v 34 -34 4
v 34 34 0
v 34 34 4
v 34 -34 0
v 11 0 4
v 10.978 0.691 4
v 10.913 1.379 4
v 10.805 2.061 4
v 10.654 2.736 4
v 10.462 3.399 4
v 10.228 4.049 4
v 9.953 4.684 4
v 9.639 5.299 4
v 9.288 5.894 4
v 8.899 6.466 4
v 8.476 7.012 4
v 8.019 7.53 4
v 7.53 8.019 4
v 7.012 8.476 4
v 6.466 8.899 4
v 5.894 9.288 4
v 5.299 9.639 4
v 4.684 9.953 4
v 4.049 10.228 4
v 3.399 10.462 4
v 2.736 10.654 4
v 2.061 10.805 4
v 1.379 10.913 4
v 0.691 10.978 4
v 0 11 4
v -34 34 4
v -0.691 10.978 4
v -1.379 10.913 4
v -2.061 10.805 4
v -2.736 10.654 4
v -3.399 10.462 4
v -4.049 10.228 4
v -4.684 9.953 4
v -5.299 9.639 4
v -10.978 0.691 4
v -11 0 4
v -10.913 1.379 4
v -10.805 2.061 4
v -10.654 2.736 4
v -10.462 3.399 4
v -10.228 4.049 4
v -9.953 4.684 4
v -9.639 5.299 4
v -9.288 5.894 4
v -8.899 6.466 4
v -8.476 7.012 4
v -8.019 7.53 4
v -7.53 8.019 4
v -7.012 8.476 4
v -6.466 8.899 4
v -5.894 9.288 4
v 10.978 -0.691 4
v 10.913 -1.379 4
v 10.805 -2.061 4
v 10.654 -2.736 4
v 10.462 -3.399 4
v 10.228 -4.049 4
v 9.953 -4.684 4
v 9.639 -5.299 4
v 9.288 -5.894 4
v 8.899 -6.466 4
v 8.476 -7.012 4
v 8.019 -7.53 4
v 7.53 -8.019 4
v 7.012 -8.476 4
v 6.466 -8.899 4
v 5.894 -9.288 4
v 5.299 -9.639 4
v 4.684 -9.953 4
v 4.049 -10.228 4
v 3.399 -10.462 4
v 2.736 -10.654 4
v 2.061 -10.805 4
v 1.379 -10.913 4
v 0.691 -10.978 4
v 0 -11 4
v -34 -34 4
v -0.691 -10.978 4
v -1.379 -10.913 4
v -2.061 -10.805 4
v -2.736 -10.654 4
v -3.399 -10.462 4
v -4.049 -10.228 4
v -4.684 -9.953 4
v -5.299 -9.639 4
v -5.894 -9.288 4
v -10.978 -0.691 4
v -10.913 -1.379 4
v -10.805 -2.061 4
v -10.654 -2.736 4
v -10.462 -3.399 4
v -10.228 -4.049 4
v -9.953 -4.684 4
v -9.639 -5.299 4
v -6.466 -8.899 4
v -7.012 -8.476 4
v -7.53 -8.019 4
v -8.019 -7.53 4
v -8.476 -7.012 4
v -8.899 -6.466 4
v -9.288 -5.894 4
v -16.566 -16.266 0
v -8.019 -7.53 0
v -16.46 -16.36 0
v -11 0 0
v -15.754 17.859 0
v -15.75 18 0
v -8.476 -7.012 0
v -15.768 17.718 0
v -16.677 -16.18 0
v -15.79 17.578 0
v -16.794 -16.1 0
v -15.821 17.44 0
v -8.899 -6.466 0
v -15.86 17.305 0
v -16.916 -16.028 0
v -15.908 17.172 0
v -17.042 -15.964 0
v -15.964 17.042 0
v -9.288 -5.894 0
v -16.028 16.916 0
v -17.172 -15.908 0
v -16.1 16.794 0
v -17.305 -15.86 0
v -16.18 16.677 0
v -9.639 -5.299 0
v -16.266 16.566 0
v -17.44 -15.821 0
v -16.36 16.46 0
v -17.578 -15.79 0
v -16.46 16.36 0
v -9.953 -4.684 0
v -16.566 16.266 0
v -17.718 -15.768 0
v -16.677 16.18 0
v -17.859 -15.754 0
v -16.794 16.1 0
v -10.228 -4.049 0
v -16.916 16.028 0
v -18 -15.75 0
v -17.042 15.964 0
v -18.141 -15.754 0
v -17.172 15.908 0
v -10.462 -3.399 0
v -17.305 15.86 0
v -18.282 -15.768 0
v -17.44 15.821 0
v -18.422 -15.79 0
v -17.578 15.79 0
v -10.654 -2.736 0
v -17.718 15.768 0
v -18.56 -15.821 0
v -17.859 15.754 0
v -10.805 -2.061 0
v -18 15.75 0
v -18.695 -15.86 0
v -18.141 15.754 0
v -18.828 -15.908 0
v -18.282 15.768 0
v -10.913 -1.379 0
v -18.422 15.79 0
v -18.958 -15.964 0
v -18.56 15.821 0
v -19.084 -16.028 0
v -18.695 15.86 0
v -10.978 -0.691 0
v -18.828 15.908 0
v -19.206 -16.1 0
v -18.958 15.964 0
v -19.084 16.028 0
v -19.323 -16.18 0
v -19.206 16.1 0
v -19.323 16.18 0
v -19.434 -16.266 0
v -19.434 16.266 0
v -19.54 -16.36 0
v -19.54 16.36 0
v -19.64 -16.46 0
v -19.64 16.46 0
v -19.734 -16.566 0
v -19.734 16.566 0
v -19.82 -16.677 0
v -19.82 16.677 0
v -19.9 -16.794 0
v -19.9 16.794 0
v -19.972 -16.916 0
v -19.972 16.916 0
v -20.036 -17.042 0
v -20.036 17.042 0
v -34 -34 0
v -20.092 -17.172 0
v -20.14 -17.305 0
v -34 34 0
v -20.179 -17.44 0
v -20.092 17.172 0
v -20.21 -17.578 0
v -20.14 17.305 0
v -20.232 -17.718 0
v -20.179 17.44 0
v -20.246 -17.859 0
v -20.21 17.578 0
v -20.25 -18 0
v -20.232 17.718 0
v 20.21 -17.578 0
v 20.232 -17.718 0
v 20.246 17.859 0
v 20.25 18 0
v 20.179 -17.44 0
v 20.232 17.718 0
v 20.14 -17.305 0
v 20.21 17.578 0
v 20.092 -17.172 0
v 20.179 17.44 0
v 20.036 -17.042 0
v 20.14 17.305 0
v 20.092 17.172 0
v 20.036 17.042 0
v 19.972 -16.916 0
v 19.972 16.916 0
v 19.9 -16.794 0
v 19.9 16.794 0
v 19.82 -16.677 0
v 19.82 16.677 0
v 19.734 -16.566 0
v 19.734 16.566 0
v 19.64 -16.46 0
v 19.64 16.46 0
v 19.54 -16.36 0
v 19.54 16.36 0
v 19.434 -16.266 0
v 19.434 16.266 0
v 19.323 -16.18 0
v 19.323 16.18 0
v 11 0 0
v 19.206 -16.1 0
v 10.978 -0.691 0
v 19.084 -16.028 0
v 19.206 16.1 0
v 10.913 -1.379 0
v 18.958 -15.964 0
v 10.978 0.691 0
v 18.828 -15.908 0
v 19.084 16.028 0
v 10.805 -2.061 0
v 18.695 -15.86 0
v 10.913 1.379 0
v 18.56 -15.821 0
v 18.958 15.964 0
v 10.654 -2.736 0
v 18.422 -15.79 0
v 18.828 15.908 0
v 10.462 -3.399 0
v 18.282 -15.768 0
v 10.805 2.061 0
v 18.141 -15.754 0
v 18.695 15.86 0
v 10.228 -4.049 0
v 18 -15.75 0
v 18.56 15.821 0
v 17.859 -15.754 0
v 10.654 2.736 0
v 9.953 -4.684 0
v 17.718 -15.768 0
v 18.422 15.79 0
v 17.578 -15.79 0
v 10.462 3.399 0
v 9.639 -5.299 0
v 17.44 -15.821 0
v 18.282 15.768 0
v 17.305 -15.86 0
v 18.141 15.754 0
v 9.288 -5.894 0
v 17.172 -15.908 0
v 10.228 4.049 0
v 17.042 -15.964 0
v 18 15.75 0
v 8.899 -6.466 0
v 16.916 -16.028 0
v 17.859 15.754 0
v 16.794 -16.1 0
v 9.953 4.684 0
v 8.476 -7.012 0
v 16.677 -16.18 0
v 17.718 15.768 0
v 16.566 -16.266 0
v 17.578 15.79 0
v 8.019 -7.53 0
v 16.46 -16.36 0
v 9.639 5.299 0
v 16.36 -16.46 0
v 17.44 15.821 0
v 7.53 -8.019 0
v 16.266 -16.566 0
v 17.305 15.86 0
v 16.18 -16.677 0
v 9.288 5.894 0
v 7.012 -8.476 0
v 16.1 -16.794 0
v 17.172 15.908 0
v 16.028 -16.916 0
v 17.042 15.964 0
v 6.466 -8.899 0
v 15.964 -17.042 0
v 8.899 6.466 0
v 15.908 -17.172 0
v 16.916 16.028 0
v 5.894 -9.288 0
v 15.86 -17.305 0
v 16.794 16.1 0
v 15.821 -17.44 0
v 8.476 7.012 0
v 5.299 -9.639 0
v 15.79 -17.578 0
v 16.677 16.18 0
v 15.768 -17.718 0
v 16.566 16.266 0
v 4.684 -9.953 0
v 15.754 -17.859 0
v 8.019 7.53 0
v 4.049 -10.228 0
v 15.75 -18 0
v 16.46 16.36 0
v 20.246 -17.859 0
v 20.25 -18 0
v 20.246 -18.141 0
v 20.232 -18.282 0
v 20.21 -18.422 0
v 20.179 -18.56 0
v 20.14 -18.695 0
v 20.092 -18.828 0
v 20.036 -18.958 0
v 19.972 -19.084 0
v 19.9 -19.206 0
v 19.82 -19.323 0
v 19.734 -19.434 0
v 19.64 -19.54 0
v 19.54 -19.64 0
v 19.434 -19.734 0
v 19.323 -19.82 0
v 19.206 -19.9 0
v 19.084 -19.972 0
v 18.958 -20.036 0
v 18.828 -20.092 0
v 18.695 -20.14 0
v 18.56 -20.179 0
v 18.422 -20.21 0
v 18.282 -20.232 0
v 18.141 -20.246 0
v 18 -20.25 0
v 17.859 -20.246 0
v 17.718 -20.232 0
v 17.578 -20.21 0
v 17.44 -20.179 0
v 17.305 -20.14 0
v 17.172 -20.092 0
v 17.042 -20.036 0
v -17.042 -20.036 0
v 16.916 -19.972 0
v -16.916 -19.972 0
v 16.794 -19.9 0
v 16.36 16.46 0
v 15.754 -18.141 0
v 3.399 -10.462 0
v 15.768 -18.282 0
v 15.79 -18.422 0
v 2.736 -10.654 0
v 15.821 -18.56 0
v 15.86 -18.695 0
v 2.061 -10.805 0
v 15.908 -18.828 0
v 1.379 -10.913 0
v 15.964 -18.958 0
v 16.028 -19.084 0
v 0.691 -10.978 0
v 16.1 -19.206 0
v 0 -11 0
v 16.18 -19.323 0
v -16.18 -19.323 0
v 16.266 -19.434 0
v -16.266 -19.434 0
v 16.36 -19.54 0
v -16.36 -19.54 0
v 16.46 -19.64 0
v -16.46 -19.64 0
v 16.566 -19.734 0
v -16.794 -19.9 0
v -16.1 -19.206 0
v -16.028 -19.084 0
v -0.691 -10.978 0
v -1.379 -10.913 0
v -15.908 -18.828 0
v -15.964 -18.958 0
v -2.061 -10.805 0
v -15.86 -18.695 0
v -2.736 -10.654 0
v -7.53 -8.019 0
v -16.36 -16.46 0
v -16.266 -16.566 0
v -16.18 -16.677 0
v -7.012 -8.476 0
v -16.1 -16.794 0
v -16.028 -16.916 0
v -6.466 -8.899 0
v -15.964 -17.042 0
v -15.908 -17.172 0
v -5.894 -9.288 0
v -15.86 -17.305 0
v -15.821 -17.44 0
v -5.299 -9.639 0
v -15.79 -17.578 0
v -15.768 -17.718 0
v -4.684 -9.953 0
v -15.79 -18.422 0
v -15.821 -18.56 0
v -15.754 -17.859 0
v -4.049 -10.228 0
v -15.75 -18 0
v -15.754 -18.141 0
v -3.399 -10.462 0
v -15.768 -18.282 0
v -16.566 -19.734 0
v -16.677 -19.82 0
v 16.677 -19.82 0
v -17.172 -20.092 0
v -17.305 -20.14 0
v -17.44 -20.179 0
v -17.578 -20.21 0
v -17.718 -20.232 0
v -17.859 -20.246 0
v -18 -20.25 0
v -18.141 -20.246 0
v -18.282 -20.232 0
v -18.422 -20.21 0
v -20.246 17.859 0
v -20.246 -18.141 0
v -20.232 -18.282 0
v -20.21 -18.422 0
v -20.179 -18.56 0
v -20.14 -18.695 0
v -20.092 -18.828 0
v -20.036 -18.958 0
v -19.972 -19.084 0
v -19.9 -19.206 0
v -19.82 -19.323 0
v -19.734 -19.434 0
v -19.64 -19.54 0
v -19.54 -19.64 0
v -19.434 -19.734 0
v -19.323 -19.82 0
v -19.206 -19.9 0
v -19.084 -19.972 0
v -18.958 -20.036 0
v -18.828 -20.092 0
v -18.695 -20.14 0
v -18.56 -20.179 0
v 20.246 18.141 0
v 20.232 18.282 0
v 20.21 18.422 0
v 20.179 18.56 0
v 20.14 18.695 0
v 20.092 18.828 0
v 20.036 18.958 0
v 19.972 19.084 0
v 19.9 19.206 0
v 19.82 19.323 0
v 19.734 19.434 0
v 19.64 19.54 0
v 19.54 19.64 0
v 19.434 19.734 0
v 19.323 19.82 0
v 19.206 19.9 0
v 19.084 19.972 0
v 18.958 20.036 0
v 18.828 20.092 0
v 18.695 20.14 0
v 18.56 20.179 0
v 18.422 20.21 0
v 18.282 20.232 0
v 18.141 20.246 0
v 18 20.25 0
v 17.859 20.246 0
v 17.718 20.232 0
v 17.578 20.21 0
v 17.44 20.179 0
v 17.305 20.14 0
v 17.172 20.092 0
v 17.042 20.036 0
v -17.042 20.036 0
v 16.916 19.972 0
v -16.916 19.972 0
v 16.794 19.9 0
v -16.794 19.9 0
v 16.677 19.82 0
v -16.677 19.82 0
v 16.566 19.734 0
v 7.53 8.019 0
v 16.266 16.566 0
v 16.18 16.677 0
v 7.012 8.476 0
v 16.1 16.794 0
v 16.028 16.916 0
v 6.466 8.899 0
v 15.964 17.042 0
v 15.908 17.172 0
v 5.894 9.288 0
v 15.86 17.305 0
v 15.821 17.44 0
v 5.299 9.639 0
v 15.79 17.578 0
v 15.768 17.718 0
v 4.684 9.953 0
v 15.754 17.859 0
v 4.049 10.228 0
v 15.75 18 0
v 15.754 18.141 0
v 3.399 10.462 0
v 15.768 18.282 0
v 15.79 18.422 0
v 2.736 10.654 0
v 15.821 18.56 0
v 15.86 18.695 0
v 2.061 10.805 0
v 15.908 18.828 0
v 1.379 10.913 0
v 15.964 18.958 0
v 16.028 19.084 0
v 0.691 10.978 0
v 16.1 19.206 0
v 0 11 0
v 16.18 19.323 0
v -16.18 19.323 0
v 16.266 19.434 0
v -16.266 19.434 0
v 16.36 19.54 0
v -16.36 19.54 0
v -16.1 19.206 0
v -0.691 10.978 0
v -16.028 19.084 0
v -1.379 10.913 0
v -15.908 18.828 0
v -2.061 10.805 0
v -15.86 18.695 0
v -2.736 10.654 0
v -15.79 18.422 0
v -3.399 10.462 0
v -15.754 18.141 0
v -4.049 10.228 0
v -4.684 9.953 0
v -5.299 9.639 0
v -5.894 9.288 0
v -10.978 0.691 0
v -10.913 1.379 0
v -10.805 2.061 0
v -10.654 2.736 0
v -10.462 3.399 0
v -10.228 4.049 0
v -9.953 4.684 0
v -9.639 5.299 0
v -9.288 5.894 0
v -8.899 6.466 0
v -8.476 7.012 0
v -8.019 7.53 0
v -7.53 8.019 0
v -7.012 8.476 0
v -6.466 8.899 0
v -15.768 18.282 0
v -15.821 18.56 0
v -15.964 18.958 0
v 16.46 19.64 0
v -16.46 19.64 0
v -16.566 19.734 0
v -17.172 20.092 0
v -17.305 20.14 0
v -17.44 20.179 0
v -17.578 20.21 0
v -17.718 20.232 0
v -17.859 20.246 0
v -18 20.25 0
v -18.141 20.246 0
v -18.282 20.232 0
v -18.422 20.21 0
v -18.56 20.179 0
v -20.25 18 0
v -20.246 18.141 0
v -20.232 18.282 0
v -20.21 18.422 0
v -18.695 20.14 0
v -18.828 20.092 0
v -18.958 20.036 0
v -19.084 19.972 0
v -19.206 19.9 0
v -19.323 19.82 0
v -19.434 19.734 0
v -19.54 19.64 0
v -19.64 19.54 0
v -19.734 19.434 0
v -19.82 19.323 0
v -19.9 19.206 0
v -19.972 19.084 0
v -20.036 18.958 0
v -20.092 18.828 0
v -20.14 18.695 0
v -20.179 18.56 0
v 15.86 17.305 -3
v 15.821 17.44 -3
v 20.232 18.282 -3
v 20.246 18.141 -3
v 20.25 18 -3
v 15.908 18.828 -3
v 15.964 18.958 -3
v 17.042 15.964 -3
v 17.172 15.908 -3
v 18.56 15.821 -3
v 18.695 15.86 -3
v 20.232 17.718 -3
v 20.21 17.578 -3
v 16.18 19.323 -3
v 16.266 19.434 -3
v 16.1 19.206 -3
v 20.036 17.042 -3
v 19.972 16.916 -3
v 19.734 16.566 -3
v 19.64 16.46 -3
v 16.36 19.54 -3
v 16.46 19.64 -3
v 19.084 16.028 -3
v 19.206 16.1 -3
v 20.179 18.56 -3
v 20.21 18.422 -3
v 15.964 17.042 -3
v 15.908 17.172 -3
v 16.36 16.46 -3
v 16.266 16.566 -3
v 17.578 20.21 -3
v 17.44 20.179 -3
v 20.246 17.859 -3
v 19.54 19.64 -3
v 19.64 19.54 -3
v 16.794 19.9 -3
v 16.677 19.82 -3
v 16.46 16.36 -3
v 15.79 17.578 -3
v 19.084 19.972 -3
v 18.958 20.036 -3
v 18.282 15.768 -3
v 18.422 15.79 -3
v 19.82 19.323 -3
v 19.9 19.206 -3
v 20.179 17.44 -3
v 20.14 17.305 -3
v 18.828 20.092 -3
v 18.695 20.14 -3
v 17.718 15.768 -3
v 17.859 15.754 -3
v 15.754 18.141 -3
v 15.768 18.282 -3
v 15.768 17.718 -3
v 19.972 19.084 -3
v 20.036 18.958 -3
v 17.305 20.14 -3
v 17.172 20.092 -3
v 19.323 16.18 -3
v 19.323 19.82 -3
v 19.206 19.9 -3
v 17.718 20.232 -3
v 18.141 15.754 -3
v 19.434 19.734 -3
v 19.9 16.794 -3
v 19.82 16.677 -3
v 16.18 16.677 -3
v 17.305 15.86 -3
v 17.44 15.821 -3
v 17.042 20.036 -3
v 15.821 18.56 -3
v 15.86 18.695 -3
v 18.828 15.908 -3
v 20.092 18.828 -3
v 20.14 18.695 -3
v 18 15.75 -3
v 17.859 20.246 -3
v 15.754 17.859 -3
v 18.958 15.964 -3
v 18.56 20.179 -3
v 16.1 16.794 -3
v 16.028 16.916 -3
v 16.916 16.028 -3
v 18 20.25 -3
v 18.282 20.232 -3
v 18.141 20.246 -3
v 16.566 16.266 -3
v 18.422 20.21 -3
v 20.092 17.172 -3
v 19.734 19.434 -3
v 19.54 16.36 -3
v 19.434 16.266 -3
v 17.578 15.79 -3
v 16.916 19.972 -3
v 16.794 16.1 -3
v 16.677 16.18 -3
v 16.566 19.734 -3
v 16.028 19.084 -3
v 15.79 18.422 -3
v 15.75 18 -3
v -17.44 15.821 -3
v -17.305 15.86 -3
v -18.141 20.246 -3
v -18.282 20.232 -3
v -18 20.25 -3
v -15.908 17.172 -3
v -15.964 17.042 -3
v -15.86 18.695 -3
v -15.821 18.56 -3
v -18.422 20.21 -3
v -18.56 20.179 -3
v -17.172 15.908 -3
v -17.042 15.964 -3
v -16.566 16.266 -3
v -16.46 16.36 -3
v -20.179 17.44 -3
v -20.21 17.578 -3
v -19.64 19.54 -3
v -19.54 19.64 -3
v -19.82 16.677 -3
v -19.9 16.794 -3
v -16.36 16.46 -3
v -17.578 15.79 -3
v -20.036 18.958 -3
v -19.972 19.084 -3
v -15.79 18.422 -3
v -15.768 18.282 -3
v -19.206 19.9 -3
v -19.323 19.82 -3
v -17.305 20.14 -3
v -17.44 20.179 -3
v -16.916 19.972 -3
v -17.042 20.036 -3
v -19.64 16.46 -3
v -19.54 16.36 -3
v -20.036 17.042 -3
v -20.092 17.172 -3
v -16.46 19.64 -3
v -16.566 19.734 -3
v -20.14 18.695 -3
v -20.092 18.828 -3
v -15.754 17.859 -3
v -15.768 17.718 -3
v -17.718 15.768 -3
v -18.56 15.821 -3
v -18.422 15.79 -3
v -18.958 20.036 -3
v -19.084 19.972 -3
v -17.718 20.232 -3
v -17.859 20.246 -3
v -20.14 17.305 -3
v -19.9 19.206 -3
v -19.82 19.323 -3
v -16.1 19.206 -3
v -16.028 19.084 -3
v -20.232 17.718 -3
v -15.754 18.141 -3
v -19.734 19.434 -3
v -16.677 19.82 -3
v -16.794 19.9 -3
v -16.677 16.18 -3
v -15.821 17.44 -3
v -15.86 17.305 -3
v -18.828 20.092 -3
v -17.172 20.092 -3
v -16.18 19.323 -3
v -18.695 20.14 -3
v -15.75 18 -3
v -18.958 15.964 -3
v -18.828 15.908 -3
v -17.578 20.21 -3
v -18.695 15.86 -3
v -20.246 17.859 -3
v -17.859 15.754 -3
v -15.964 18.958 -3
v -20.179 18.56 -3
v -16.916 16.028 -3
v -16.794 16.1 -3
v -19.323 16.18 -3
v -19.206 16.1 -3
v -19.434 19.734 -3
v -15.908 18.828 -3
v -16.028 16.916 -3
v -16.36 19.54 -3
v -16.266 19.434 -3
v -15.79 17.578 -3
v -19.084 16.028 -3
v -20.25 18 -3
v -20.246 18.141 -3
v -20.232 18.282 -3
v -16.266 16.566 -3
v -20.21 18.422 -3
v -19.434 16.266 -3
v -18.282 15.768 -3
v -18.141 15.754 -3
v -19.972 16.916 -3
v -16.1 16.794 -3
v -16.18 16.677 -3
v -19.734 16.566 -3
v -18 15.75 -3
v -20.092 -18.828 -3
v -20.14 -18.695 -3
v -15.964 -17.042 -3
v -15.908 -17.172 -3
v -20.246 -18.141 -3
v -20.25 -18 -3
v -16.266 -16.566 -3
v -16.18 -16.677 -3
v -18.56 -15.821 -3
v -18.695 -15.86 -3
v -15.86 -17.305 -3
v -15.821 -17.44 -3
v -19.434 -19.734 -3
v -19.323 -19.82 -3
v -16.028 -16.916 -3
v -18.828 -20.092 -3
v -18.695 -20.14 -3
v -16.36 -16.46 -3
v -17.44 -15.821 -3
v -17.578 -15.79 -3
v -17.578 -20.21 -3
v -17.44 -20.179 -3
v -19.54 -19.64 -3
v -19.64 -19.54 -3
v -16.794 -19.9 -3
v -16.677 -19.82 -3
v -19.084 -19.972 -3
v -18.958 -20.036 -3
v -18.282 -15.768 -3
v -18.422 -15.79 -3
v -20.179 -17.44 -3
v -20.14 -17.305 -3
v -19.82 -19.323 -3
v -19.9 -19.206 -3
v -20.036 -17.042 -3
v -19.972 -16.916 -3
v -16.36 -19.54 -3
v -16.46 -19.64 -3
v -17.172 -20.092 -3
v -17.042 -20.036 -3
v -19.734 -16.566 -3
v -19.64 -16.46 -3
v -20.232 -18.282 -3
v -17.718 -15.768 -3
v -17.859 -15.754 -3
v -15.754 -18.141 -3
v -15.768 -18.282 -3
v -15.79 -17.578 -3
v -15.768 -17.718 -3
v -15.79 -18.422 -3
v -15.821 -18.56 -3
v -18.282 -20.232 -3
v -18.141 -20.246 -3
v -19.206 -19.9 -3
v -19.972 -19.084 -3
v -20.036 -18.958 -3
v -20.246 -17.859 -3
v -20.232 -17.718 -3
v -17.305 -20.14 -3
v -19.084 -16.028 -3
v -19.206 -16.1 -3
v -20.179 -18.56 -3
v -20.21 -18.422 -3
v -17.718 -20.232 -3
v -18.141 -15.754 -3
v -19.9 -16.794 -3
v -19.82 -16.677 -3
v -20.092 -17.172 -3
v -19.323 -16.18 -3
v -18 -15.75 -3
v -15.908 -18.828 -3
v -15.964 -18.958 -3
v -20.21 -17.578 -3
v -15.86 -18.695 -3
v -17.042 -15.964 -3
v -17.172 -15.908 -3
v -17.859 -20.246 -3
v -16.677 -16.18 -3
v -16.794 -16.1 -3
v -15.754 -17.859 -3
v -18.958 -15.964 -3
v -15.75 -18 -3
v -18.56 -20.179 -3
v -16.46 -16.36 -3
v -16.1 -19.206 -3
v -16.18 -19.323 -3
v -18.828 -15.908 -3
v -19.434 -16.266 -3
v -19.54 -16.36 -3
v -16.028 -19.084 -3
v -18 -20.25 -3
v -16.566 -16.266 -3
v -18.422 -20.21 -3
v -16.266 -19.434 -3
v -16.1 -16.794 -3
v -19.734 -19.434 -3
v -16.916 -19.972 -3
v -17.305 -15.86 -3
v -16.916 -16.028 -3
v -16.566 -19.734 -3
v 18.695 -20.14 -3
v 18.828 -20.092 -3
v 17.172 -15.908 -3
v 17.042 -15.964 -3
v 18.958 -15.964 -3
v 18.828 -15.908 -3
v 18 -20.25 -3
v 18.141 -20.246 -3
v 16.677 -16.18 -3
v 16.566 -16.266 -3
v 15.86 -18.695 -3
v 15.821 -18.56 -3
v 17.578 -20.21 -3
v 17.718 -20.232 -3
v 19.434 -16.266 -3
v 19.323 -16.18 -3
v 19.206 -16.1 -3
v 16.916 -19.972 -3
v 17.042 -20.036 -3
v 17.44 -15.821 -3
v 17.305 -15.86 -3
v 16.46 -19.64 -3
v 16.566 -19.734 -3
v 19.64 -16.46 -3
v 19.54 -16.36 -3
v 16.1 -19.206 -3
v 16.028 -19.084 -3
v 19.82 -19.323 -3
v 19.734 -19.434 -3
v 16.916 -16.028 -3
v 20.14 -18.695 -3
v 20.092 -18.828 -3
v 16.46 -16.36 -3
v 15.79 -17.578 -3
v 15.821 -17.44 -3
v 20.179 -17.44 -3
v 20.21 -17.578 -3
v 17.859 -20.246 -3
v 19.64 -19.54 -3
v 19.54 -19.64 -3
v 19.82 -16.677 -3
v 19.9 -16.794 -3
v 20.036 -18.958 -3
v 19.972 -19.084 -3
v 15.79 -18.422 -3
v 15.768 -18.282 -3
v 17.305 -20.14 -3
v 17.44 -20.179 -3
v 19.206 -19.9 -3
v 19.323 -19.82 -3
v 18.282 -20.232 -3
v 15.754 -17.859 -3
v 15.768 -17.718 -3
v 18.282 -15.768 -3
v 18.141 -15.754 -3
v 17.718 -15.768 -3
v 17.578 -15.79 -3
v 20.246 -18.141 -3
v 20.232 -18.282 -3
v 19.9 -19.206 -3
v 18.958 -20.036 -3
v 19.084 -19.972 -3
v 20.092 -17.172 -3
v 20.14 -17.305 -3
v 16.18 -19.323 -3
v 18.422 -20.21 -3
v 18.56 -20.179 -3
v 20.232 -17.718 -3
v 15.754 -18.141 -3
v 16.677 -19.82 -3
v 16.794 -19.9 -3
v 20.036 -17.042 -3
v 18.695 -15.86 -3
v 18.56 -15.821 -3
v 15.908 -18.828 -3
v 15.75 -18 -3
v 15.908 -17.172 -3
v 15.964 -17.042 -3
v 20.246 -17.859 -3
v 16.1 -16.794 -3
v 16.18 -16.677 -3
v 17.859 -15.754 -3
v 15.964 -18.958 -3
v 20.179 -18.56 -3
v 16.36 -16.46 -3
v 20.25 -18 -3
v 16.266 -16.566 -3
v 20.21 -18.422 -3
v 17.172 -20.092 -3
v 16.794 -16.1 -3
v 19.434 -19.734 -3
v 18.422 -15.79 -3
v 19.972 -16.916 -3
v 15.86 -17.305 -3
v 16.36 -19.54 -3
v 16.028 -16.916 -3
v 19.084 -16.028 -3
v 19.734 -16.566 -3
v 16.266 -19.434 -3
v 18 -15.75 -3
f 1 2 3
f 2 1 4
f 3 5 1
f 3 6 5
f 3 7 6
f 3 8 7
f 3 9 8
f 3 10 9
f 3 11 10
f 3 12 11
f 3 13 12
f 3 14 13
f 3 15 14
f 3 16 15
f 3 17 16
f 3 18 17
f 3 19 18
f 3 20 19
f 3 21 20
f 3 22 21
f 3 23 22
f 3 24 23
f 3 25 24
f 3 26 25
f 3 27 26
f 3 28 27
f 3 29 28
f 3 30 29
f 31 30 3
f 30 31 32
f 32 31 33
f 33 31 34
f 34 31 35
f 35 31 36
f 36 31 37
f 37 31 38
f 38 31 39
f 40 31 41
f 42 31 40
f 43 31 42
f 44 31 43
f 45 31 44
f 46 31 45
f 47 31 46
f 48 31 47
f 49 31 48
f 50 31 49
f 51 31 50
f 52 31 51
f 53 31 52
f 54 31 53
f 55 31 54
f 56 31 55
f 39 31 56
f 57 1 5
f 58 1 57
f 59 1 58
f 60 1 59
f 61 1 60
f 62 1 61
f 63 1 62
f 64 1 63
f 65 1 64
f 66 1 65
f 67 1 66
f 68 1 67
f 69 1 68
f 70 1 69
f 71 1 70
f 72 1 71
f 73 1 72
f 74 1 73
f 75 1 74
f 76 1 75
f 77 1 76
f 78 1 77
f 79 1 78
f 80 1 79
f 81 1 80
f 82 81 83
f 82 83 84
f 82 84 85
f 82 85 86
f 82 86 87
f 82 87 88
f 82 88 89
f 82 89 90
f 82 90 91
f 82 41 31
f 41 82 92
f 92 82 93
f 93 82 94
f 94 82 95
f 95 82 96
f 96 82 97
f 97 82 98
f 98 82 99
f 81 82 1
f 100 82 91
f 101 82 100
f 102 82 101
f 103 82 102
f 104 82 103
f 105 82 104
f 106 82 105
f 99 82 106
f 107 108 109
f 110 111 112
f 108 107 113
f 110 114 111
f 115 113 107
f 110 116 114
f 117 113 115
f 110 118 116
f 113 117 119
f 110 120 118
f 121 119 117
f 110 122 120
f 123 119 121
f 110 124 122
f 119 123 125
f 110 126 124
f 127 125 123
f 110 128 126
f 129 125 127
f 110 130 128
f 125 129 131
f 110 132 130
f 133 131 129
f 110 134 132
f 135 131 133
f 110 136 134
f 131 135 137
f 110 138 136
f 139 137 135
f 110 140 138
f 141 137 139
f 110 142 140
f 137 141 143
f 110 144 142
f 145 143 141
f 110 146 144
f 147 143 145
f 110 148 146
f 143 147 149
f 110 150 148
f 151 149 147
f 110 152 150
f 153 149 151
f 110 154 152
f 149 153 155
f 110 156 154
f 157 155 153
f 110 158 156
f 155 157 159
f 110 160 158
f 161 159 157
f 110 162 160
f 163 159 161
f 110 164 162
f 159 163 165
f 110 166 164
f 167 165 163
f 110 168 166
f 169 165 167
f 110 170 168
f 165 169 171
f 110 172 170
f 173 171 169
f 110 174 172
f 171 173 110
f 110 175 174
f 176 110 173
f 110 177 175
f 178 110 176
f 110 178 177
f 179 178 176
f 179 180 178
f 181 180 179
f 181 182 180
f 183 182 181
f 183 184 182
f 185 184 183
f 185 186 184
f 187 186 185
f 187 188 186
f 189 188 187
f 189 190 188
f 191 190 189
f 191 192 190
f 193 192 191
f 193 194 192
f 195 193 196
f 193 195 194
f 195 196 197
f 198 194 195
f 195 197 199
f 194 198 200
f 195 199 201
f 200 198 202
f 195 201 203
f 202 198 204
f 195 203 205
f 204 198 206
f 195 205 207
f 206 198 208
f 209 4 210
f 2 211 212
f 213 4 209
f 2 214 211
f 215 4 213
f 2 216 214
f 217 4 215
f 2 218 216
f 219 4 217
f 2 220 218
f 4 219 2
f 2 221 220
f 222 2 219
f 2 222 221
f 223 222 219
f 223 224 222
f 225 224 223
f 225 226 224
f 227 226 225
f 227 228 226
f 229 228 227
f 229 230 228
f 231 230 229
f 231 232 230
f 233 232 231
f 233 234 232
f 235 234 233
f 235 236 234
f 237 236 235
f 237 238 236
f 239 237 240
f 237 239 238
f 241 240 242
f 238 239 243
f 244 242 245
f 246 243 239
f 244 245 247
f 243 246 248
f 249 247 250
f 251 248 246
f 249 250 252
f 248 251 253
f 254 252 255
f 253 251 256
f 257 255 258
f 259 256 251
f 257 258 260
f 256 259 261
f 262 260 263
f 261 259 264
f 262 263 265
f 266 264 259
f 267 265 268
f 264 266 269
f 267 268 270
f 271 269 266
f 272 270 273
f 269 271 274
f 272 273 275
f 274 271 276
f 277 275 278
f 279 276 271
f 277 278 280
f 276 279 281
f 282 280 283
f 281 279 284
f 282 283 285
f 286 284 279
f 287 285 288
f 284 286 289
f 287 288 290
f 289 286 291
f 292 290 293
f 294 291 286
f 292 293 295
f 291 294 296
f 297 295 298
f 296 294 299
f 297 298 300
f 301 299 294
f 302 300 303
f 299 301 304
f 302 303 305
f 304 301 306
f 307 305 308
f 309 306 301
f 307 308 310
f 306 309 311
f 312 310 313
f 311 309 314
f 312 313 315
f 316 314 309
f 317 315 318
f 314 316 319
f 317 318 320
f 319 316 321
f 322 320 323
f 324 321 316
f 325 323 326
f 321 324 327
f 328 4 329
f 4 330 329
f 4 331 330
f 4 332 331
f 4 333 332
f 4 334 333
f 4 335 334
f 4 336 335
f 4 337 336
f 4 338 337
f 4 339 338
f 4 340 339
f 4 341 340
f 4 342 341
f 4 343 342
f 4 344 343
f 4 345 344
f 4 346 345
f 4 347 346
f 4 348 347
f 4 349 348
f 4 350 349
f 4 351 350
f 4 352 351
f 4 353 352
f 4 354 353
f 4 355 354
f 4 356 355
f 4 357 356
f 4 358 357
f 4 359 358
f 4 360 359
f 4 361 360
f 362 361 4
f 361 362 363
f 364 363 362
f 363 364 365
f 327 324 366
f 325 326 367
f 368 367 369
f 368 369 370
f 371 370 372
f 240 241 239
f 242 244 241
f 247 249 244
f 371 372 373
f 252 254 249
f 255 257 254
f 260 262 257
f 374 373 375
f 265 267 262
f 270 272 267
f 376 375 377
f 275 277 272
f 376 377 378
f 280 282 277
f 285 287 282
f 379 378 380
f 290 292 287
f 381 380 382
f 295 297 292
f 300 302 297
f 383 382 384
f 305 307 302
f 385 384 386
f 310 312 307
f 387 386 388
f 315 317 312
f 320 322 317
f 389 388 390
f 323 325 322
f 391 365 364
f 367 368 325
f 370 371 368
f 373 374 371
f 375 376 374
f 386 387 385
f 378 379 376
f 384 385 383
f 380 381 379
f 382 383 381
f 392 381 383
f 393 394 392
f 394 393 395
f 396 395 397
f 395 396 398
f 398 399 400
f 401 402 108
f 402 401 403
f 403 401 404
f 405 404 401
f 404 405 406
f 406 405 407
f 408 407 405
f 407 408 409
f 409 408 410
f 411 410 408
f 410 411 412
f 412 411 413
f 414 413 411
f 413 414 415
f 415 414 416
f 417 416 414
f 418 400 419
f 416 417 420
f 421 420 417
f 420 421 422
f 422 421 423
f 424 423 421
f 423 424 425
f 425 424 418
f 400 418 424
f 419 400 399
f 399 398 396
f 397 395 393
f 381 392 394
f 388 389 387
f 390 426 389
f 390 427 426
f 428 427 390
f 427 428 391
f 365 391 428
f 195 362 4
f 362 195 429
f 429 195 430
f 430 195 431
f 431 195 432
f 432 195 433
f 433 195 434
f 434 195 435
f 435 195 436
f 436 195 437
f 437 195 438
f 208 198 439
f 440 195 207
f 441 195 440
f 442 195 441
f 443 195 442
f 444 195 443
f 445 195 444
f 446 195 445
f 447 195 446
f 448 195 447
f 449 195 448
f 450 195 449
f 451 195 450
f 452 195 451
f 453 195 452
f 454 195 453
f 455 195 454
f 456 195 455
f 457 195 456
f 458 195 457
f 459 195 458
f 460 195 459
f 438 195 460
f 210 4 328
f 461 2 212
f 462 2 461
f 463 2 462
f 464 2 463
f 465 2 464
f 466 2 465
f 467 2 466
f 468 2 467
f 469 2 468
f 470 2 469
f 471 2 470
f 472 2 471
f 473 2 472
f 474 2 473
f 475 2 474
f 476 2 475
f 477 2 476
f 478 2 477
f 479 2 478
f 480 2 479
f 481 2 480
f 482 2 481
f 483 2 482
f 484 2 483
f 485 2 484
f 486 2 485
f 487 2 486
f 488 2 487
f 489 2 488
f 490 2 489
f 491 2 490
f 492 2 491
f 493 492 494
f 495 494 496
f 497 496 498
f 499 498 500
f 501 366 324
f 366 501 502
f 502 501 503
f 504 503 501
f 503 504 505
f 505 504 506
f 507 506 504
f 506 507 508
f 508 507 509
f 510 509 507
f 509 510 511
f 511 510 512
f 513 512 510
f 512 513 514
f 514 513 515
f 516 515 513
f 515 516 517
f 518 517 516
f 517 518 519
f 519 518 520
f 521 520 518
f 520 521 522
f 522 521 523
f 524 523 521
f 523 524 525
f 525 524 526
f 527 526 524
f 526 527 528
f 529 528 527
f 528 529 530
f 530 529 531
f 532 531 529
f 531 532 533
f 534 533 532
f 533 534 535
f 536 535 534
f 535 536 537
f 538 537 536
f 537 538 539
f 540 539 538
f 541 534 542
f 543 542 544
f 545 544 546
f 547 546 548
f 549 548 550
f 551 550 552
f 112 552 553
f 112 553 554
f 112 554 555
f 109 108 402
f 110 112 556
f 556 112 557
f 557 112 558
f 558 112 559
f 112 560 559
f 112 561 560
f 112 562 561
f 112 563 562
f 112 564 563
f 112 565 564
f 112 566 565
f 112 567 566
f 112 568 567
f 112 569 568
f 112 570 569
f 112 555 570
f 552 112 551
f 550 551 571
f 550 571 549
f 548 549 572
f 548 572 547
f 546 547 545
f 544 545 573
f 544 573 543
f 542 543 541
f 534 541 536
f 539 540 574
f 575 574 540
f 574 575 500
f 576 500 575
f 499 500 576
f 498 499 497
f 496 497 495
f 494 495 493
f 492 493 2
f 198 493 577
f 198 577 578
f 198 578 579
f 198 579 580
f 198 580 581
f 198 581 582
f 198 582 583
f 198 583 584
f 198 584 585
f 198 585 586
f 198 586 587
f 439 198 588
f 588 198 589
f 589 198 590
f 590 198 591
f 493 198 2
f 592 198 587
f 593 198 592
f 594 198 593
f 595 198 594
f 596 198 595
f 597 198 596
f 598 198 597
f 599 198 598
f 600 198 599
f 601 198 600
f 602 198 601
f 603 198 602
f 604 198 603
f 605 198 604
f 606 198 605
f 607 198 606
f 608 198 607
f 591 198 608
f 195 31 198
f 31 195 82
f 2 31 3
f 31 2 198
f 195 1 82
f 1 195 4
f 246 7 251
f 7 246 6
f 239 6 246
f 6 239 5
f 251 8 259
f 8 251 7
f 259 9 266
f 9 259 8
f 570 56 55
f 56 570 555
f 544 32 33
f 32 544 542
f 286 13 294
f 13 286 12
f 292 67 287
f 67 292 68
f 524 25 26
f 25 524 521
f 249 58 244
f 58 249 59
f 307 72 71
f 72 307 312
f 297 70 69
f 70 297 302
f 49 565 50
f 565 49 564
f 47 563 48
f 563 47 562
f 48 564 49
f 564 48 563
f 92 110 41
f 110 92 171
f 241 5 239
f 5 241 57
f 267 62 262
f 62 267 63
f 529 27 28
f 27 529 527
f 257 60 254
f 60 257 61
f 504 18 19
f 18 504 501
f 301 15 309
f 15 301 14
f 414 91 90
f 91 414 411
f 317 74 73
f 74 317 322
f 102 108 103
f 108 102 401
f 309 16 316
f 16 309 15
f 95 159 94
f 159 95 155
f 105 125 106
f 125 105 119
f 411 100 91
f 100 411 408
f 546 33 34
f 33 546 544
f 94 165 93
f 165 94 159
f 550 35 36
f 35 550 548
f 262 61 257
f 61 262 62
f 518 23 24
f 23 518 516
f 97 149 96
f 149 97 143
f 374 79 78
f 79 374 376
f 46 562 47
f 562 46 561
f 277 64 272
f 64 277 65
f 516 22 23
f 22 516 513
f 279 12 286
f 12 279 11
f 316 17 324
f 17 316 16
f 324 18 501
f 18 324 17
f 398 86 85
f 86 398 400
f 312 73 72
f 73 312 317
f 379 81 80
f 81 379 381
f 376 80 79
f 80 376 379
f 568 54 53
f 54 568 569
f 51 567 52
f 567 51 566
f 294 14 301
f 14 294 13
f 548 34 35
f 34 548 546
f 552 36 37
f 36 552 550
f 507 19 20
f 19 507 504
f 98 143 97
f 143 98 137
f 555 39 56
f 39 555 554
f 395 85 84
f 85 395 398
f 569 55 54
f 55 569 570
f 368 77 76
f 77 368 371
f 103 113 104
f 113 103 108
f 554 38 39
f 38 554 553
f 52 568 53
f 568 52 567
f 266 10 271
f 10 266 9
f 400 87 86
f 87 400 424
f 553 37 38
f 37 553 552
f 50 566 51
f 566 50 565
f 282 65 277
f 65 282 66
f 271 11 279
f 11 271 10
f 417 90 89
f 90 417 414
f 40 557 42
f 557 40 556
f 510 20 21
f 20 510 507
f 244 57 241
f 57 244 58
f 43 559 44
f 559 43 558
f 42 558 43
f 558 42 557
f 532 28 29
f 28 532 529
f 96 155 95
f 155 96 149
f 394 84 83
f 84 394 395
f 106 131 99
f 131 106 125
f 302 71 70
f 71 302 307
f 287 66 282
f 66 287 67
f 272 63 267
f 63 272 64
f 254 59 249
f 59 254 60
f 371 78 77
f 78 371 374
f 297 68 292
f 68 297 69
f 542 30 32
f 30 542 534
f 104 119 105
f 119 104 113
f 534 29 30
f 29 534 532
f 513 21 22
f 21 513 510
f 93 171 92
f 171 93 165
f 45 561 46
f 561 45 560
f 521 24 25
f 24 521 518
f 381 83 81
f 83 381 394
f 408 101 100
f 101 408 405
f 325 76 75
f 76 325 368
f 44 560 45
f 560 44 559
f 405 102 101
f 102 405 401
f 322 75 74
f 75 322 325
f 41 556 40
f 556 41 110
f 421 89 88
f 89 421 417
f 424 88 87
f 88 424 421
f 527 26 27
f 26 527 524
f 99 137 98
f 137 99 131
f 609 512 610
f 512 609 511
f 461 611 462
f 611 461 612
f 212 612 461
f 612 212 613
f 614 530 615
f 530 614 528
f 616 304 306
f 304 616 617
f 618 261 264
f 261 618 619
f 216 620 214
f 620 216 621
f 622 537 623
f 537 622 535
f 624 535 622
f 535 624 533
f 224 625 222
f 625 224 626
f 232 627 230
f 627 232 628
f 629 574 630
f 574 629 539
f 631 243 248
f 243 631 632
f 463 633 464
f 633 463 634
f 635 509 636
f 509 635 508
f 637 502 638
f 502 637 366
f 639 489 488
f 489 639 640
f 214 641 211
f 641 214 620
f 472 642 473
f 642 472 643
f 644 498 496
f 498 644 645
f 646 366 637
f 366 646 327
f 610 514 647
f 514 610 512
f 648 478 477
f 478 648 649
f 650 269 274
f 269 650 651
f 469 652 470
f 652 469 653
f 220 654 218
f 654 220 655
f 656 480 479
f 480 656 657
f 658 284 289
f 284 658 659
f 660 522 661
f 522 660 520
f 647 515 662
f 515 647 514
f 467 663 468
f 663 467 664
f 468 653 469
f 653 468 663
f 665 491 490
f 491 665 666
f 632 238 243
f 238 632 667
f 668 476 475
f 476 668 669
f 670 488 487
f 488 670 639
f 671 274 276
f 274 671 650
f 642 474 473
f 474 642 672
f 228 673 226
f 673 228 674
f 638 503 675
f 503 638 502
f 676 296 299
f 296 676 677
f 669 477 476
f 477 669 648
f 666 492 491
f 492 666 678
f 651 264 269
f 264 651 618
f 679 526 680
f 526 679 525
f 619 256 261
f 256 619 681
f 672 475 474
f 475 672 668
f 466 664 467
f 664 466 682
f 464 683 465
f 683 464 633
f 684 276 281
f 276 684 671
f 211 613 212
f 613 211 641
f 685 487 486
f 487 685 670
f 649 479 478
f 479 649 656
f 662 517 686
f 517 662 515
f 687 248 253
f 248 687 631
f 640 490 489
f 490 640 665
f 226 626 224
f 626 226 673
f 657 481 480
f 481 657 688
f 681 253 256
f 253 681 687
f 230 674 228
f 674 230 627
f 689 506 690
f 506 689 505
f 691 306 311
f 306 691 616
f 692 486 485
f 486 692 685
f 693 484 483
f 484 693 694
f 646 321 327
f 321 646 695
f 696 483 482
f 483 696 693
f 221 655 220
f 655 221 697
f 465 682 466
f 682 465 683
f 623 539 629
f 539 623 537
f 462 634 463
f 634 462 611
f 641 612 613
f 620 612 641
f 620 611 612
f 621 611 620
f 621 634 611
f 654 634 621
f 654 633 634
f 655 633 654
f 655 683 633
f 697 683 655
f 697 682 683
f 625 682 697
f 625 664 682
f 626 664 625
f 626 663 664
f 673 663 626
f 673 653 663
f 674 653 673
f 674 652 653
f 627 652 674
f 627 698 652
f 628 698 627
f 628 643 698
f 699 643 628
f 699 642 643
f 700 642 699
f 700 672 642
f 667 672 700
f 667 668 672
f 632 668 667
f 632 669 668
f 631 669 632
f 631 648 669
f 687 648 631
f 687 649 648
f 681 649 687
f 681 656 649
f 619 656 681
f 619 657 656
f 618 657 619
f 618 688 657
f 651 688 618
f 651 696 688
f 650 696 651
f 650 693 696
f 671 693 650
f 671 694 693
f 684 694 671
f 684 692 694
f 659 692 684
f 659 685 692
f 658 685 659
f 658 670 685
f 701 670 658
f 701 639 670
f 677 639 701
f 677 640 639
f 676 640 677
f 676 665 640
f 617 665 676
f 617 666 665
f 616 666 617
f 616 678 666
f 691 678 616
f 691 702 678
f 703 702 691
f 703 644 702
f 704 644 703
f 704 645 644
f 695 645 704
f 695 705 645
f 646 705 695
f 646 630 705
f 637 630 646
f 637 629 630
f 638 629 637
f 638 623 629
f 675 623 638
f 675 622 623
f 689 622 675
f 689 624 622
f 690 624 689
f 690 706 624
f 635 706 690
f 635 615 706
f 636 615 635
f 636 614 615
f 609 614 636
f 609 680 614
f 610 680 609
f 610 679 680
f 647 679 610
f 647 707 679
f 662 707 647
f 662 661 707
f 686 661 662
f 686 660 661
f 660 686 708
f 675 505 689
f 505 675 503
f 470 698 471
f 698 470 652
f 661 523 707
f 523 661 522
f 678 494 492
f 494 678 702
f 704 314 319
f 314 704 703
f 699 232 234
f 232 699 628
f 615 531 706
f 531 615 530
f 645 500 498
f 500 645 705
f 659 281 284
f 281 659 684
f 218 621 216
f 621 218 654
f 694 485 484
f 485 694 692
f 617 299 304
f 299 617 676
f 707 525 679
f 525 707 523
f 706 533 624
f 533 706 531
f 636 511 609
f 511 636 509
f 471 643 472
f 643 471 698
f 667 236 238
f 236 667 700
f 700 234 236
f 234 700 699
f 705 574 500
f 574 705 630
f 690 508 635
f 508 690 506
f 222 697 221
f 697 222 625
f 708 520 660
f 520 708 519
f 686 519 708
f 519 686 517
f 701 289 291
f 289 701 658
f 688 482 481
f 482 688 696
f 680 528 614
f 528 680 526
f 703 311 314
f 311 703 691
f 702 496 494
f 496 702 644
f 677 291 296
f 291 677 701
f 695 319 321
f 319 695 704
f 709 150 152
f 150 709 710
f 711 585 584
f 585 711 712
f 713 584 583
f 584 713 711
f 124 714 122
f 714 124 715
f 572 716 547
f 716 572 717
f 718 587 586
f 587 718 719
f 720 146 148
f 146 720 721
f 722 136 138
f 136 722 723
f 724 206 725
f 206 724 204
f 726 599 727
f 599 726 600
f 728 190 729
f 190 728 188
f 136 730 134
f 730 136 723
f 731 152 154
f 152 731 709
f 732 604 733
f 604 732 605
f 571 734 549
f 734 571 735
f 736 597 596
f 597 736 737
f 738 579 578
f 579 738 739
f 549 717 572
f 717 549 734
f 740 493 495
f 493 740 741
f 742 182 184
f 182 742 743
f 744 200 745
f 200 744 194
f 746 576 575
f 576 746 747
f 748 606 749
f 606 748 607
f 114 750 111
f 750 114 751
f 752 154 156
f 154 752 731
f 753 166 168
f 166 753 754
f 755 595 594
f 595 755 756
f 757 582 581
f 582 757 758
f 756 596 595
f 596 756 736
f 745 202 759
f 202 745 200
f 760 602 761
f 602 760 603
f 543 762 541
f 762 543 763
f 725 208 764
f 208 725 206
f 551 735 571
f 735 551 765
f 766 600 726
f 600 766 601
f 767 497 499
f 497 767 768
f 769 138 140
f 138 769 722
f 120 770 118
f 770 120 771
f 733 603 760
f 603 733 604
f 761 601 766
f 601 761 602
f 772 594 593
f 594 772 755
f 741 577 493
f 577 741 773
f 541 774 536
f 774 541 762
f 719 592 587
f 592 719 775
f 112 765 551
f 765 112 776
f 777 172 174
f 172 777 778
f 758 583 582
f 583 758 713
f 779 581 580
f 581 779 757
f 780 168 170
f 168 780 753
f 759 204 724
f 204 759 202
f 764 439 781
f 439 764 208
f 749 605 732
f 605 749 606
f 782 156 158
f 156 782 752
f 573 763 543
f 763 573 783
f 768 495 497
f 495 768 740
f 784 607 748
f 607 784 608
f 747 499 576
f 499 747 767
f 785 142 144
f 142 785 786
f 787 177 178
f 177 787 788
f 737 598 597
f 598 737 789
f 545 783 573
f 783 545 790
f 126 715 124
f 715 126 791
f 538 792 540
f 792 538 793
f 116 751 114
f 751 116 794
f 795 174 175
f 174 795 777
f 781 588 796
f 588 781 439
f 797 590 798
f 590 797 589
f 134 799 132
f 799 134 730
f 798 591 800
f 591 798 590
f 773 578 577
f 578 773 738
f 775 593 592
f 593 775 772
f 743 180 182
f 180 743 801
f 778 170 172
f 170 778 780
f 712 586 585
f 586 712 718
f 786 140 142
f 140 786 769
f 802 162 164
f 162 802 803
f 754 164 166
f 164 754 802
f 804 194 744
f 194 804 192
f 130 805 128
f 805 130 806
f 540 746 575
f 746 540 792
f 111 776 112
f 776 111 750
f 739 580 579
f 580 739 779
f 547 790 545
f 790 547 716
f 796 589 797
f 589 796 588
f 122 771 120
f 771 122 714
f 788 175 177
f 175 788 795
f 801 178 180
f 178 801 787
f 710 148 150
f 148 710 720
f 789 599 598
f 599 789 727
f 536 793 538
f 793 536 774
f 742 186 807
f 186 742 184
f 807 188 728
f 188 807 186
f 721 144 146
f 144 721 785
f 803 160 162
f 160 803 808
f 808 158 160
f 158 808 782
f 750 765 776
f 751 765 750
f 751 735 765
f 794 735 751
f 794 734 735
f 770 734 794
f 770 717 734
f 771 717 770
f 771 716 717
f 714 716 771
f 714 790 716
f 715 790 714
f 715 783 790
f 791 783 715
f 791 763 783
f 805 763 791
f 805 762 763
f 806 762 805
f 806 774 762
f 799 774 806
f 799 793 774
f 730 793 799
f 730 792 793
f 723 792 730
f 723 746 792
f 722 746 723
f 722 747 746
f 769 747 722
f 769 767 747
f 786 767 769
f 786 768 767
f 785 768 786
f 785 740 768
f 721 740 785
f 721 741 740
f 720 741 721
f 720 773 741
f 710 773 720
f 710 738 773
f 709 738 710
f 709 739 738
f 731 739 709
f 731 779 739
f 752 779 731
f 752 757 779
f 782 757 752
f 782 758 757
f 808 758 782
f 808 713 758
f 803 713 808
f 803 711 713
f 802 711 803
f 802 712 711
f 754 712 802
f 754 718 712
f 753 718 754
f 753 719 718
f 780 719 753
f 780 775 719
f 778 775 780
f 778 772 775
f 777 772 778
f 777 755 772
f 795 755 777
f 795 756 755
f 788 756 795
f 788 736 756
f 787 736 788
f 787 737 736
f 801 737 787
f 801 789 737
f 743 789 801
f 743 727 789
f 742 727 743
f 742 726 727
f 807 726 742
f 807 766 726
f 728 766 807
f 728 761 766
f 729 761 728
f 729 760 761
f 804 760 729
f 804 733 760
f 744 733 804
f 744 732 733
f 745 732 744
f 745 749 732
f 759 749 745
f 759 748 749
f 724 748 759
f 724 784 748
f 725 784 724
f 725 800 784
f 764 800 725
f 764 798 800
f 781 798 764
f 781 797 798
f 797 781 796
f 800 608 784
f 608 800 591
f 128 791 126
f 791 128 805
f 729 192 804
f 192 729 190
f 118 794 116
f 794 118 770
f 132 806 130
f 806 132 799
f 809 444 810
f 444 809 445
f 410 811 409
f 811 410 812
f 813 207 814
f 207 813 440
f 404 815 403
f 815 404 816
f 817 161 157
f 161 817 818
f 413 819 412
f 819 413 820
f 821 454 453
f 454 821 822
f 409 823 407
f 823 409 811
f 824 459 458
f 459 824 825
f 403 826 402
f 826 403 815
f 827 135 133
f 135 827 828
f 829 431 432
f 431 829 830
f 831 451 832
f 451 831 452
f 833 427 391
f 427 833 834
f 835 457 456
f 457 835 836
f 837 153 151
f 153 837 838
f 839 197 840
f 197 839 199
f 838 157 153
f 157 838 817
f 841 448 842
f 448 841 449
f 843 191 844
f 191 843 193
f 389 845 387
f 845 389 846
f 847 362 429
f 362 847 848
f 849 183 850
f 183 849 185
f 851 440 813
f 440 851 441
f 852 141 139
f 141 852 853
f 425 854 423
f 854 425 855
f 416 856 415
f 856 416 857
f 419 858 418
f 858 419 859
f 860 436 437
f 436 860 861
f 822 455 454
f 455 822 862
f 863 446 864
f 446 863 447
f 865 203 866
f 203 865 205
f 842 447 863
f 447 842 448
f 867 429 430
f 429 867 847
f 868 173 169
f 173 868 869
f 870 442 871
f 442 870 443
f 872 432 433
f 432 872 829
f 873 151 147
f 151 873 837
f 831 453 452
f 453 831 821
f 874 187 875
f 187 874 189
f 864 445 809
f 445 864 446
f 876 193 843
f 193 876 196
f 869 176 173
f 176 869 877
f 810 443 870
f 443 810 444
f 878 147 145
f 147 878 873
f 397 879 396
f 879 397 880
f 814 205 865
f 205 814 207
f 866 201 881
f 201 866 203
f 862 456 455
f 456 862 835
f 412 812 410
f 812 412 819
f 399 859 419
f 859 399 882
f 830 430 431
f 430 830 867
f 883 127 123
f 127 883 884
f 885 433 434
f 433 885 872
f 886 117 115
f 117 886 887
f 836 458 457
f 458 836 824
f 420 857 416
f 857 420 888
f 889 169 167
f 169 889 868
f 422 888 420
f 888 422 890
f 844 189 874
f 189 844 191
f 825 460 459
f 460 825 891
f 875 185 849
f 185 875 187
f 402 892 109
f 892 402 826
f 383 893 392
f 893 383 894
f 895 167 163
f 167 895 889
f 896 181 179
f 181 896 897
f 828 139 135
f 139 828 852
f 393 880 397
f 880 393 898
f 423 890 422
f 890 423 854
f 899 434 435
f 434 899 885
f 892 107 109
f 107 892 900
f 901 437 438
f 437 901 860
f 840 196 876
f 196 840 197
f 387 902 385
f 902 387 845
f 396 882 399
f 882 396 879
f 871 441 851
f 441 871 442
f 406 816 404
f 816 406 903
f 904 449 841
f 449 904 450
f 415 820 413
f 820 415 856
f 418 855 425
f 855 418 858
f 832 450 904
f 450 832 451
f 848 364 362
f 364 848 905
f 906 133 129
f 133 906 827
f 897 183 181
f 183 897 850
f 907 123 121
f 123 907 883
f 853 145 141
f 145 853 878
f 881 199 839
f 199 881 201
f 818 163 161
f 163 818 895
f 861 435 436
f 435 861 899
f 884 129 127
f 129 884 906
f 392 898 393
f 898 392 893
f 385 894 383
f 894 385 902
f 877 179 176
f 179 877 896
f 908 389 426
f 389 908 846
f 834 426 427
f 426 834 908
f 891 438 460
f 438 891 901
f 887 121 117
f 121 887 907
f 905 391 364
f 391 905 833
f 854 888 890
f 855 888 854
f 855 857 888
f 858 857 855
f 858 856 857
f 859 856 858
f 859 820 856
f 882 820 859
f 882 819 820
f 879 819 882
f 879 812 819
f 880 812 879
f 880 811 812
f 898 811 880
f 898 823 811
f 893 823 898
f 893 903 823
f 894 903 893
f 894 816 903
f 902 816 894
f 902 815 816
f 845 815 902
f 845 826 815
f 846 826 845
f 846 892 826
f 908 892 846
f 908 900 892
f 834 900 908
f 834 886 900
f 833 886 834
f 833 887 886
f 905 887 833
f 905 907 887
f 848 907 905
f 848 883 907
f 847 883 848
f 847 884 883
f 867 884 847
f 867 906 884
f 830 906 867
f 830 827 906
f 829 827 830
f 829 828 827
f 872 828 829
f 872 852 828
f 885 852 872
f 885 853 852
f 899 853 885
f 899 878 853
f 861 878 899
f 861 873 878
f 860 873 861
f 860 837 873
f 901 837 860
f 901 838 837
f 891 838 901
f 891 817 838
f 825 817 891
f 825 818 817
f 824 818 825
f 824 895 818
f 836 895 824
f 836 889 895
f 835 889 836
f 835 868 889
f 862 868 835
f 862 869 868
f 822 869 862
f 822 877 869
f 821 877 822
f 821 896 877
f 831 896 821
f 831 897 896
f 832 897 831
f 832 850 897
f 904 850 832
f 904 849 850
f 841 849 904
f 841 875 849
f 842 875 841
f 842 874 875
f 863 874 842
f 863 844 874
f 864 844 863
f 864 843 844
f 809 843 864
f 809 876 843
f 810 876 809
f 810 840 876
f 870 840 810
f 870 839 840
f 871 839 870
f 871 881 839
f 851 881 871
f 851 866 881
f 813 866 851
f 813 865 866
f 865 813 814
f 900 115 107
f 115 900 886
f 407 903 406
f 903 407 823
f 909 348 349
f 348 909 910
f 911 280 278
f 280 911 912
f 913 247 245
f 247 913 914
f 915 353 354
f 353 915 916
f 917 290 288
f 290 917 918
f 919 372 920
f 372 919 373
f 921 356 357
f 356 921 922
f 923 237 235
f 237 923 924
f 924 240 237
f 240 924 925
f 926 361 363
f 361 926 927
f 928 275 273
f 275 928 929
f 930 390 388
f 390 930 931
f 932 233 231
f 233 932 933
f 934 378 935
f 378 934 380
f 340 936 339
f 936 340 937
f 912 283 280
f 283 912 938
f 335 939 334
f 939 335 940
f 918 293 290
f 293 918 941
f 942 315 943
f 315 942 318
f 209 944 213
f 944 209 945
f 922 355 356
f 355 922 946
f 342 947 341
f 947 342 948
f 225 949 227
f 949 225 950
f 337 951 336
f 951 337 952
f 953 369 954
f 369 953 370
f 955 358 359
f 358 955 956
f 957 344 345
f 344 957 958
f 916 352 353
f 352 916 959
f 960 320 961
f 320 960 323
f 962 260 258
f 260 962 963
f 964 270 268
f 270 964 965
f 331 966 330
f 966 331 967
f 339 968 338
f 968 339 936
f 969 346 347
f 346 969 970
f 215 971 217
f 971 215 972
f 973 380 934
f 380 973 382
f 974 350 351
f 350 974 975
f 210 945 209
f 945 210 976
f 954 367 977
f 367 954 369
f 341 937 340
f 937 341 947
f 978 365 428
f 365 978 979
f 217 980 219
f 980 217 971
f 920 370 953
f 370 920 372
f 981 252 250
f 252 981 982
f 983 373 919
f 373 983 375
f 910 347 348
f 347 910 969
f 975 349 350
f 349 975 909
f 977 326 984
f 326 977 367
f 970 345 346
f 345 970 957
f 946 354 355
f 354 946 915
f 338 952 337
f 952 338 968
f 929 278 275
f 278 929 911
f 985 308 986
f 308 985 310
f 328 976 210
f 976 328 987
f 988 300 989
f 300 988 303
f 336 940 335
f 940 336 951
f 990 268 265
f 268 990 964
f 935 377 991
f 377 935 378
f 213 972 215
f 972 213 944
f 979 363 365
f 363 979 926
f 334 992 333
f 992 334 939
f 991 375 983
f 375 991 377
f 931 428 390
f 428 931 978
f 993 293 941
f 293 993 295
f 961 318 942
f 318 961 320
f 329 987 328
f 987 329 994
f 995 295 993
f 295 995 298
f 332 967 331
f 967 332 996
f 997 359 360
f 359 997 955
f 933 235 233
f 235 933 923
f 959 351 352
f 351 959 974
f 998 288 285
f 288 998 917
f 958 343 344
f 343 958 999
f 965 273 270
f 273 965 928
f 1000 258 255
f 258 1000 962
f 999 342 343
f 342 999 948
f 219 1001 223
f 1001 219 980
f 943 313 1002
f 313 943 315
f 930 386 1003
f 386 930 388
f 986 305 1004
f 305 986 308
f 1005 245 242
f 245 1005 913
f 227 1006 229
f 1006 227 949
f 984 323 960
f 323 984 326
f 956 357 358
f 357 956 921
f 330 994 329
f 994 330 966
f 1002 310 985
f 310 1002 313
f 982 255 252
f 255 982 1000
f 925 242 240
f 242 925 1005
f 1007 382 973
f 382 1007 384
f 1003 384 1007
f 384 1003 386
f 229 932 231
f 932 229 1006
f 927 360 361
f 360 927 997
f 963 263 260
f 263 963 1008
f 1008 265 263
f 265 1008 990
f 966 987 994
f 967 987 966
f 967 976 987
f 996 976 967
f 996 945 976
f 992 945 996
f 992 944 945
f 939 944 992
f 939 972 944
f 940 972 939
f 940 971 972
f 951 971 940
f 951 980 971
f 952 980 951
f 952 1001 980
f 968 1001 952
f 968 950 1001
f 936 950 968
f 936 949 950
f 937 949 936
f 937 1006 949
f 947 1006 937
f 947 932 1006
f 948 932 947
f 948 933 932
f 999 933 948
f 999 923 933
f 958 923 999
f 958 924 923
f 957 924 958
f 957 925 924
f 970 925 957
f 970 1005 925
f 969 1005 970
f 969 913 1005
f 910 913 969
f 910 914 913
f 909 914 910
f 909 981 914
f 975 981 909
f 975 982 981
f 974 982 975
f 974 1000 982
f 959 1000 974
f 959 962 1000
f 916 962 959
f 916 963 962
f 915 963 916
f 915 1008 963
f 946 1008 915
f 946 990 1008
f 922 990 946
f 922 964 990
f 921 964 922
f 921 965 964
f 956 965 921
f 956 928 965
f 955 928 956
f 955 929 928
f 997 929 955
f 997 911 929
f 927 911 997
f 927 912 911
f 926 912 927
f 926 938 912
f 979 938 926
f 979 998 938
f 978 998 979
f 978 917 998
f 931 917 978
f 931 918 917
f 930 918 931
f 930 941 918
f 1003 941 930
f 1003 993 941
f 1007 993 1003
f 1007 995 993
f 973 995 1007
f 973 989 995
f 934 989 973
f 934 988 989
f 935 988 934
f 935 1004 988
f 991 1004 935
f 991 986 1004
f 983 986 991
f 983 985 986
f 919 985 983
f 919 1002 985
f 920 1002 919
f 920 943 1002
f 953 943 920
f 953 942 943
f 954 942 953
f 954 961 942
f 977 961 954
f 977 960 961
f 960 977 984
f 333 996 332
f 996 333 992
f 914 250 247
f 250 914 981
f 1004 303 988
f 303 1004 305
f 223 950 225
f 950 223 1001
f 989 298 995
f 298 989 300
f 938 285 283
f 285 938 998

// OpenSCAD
// file: bg-cprsd432-dimensions.scad
screwHoleGap = 36;
screwHoleR = 4.5/2;
pannelSize = 68;
centerHoleR = 11.2/2;
centerHoleRingR = 22/2;
centerHoleRingDepth = 2;
pannelDepth = 3;
wallWidth = centerHoleRingDepth;
// main file
include <bg-cprsd432-dimensions.scad>

$fn=100;

difference() {
    translate([-pannelSize / 2, -pannelSize / 2, 0]){
        cube([pannelSize, pannelSize, centerHoleRingDepth * 2]);
    }
    translate([0,0,-0.01]) {
        cylinder(r=centerHoleRingR, h=centerHoleRingDepth * 2 + 0.02);
    }
}

for (rotate=[0, 90, 180, 270]) {
    rotate([0,0,rotate]) {
        translate([screwHoleGap / 2,screwHoleGap / 2, -pannelDepth]) {
            cylinder(r=screwHoleR, h=pannelDepth + 0.1);
        }
    }
}
